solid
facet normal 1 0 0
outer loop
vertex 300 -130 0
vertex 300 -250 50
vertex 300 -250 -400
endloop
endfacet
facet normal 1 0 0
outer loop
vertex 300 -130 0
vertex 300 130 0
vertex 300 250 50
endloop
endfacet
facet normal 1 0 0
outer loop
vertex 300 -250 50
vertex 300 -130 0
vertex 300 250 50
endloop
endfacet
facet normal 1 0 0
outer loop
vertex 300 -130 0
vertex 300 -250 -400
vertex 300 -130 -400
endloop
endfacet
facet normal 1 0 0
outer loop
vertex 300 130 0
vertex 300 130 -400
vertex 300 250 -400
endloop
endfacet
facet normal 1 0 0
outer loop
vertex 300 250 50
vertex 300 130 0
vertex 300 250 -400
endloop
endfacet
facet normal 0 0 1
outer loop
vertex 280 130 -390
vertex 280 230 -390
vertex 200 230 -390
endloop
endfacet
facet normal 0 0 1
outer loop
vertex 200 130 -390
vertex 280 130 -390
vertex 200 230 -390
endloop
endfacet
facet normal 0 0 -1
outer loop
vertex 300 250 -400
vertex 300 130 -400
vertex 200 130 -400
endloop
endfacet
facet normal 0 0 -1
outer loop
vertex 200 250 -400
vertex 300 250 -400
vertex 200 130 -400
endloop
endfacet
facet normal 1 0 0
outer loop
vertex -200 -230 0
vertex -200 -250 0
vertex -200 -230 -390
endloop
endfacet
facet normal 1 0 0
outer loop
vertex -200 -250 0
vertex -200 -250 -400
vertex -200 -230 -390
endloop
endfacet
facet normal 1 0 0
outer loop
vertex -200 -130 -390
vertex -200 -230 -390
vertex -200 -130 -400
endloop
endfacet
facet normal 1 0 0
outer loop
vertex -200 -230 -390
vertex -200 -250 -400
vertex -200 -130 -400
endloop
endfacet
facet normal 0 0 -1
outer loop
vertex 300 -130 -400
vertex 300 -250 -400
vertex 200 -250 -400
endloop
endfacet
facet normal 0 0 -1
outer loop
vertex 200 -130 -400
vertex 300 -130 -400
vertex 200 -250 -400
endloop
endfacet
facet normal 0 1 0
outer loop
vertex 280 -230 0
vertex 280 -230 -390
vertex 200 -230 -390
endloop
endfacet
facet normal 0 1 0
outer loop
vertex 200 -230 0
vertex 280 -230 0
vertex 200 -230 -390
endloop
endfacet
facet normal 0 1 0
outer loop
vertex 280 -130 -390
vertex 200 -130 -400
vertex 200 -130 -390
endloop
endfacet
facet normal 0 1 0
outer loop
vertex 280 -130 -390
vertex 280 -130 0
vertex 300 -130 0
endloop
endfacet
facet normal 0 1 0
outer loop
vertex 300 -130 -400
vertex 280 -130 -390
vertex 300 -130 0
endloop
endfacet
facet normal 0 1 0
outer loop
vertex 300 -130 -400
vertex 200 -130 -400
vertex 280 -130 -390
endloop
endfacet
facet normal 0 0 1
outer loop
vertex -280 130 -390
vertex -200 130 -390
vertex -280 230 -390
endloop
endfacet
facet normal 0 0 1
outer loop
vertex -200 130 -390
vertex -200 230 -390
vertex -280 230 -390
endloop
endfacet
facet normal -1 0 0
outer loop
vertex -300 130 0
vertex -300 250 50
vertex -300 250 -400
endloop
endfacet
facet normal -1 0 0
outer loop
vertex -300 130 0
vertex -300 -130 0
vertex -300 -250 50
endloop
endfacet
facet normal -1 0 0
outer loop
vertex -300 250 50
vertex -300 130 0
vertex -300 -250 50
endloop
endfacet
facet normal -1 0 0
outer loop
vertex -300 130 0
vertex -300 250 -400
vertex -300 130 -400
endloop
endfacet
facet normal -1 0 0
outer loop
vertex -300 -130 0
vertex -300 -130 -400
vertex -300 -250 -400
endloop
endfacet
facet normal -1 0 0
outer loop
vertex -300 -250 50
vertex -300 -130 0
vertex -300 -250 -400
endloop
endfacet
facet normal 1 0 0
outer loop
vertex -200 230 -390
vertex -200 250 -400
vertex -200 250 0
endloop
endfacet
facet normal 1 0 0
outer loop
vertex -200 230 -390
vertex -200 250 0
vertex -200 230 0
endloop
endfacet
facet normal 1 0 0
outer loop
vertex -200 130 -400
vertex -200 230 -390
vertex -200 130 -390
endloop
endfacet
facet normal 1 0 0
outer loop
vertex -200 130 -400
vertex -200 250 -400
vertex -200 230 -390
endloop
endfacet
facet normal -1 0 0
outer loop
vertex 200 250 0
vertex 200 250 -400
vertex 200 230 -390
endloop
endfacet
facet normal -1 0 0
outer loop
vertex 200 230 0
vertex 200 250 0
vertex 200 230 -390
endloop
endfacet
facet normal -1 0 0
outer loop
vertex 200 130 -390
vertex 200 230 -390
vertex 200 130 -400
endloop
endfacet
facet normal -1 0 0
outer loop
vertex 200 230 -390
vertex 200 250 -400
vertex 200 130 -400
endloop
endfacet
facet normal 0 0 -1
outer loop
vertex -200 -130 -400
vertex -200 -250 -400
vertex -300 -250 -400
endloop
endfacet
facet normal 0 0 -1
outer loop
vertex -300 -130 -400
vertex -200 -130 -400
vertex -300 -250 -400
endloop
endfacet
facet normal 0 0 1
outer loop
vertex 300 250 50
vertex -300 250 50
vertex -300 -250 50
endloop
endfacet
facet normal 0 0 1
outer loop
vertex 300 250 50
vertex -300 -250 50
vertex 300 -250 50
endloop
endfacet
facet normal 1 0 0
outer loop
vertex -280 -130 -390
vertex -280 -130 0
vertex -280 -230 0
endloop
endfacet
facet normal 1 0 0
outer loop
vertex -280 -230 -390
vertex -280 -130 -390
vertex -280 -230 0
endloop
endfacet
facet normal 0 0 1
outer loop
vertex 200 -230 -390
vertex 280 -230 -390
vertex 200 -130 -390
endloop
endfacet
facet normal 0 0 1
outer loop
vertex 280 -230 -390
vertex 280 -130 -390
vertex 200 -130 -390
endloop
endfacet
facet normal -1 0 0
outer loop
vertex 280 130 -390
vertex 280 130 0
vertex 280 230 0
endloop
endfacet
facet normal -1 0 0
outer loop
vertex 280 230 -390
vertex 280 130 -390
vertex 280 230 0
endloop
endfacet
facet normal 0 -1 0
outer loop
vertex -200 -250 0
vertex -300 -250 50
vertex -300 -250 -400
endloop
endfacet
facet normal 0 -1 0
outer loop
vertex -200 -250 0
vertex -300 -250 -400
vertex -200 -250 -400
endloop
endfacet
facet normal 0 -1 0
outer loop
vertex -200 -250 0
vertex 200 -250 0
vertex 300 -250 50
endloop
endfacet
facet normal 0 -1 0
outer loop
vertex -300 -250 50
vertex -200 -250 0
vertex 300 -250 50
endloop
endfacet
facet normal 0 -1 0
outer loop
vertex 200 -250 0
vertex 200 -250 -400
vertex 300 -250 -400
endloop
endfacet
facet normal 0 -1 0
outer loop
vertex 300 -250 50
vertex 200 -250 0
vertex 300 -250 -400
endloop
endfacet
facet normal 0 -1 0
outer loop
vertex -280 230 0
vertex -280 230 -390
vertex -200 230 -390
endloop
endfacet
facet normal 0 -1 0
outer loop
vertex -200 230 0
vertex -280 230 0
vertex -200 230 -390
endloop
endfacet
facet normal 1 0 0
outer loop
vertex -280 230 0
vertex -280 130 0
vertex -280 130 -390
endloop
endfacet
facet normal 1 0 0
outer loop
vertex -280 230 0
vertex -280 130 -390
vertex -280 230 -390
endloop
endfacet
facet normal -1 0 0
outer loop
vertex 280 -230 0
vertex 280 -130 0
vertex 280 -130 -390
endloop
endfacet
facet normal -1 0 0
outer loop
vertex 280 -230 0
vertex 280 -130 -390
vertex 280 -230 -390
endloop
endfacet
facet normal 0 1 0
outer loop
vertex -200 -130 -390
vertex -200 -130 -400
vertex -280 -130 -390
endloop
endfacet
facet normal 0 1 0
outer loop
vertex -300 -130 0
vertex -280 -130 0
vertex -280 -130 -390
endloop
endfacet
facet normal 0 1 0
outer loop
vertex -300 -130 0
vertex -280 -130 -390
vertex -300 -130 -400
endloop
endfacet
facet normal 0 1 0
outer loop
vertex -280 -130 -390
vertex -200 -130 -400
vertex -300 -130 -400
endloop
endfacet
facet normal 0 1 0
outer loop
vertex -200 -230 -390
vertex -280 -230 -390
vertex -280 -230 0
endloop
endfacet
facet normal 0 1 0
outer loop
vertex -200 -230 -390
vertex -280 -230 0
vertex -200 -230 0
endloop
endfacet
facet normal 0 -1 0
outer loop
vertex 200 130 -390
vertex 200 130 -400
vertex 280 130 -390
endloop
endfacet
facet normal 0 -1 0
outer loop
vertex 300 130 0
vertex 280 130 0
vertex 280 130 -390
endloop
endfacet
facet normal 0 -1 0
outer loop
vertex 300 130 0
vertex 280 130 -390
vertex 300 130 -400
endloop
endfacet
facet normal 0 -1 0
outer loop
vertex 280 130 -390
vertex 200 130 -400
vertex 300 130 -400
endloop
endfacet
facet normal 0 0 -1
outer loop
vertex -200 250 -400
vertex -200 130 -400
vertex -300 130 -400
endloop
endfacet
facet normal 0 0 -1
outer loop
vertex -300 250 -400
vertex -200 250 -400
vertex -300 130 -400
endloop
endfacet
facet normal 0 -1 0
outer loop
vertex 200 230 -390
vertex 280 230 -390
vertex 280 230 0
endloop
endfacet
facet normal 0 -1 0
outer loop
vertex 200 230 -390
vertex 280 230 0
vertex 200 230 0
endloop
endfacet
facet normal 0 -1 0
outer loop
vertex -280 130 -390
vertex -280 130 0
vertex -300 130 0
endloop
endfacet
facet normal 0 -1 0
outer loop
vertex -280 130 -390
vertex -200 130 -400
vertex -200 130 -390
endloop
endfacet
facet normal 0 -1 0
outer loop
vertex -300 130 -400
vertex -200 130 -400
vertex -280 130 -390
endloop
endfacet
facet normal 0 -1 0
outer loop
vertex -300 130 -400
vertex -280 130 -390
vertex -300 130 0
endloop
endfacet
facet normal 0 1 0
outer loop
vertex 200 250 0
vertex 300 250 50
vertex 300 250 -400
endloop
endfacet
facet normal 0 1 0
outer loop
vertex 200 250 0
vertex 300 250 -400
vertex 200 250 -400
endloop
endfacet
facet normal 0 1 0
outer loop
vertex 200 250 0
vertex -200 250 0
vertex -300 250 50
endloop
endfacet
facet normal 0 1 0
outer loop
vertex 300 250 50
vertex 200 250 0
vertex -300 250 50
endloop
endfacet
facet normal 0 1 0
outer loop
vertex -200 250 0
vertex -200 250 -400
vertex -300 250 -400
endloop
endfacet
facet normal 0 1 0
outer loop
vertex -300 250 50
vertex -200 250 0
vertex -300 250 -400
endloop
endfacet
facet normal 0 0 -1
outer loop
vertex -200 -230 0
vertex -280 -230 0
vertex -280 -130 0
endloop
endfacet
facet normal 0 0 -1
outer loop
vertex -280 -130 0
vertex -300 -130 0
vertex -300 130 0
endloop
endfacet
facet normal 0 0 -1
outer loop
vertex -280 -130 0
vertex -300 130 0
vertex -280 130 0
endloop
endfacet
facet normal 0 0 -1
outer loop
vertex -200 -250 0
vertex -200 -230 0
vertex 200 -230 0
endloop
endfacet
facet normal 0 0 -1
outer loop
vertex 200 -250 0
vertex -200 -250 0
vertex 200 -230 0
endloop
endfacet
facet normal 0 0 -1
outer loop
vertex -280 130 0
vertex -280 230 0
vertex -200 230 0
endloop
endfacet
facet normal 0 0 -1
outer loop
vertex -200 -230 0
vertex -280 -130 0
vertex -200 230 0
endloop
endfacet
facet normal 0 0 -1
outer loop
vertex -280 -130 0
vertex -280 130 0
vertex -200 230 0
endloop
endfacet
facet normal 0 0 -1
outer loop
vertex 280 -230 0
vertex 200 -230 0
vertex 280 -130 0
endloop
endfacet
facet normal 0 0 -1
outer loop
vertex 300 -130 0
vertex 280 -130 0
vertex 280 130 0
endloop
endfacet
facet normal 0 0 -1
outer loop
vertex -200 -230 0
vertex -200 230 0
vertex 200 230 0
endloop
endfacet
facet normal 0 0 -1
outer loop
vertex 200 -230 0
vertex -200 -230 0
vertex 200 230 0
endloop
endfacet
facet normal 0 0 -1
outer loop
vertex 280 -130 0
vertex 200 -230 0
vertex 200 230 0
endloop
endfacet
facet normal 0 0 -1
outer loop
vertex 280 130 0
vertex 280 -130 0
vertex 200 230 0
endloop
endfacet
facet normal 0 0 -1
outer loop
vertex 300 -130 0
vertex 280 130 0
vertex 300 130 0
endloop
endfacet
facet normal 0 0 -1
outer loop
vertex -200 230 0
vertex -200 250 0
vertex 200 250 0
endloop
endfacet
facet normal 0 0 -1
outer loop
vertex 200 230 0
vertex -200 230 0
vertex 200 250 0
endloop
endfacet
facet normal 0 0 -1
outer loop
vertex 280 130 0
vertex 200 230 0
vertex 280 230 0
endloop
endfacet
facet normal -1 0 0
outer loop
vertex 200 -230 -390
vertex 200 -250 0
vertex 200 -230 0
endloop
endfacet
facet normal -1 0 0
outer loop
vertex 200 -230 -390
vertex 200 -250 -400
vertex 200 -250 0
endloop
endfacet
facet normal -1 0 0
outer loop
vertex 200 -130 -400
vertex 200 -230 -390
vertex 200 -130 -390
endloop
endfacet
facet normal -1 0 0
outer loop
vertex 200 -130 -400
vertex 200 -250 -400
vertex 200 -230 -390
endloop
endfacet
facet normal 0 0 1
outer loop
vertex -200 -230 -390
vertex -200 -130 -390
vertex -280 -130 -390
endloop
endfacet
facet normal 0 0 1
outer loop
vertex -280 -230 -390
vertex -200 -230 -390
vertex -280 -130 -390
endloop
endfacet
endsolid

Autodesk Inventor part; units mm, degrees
ref_plane "YZ Plane" through (0, 0, 0) normal (1, 0, 0) x (0, 1, 0)
ref_plane "XZ Plane" through (0, 0, 0) normal (0, 1, 0) x (-1, 0, 0)
ref_plane "XY Plane" through (0, 0, 0) normal (0, 0, 1) x (1, 0, 0)
sketch "Boceto1" plane through (0, 0, 0) normal (0, 0, 1) x (1, 0, 0)
  line L0 (-300, -250) -> (300, -250)
  line L1 (300, -250) -> (300, 250)
  line L2 (300, 250) -> (-300, 250)
  line L3 (-300, 250) -> (-300, -250)
  line L4 (-300, -250) -> (300, 250) construction
  line L5 (300, -250) -> (-300, 250) construction
  line L6 (-300, 250) -> (-200, 250)
  line L7 (-200, 250) -> (-200, 230)
  line L8 (-280, 130) -> (-300, 130)
  line L9 (-300, 130) -> (-300, 250)
  line L10 (-300, 130) -> (-280, 130)
  line L11 (-280, 130) -> (-280, 230)
  line L12 (-280, 230) -> (-200, 230)
  line L13 (0, 0) -> (0, 50)
  line L14 (0, 0) -> (-60, 0)
  line L15 (-300, 250) -> (300, 250)
  line L16 (300, 250) -> (300, -250)
  line L17 (-300, -250) -> (300, 250) construction
  line L18 (300, 250) -> (200, 250)
  line L19 (200, 250) -> (200, 230)
  line L20 (300, 130) -> (300, 250)
  line L21 (280, 130) -> (280, 230)
  line L22 (280, 230) -> (200, 230)
  line L23 (280, 130) -> (300, 130)
  line L24 (300, -250) -> (-300, -250)
  line L25 (-300, -250) -> (-300, 250)
  line L26 (300, 250) -> (-300, -250) construction
  line L27 (-300, -250) -> (-200, -250)
  line L28 (-200, -250) -> (-200, -230)
  line L29 (-280, -130) -> (-300, -130)
  line L30 (-300, -130) -> (-300, -250)
  line L31 (-300, -130) -> (-280, -130)
  line L32 (-280, -130) -> (-280, -230)
  line L33 (-280, -230) -> (-200, -230)
  line L34 (-300, -250) -> (300, -250)
  line L35 (300, -250) -> (200, -250)
  line L36 (200, -250) -> (200, -230)
  line L37 (300, -130) -> (300, -250)
  line L38 (280, -130) -> (280, -230)
  line L39 (280, -230) -> (200, -230)
  line L40 (280, -130) -> (300, -130)
  point P0 (-300, 130)
  point P1 (-300, -130)
  point P2 (-200, -250)
  point P3 (200, -250)
  point P4 (300, -130)
  point P5 (300, 130)
  point P6 (200, 250)
  point P7 (-200, 250)
  dimension "d0" = 600
  dimension "d1" = 500
  dimension "d4" = 20
  dimension "d5" = 100
  dimension "d6" = 60
  dimension "d13" = 20
extrude "Extrusión1" add sketch "Boceto1" along normal blind 50 contours L28 L33 L32 L29 L3 L8 L11 L12 L7 L2 L19 L22 L21 L23 L1 L40 L38 L39 L36 L0
extrude "Extrusión2" add sketch "Boceto1" along normal blind 50 and the other way blind 390 contours L3 L29 L32 L33 L28 L0 | L36 L39 L38 L40 L1 L0 | L3 L2 L7 L12 L11 L8 | L23 L21 L22 L19 L2 L1
sketch "Boceto2" plane through (0, 0, -390) normal (0, 0, -1) x (-1, 0, 0)
  line L0 (280, 230) -> (280, 130) projected
  line L1 (200, 230) -> (280, 230) projected
  line L2 (200, 250) -> (200, 230) projected
  line L3 (-200, 250) -> (200, 250) projected
  line L4 (-200, 230) -> (-200, 250) projected
  line L5 (-280, 230) -> (-200, 230) projected
  line L6 (-280, 130) -> (-280, 230) projected
  line L7 (-300, 130) -> (-280, 130) projected
  line L8 (-300, -130) -> (-300, 130) projected
  line L9 (-280, -130) -> (-300, -130) projected
  line L10 (-280, -230) -> (-280, -130) projected
  line L11 (-200, -230) -> (-280, -230) projected
  line L12 (-200, -250) -> (-200, -230) projected
  line L13 (200, -250) -> (-200, -250) projected
  line L14 (200, -230) -> (200, -250) projected
  line L15 (280, -230) -> (200, -230) projected
  line L16 (280, -130) -> (280, -230) projected
  line L17 (300, -130) -> (280, -130) projected
  line L18 (300, 130) -> (300, -130) projected
  line L19 (280, 130) -> (300, 130) projected
  line L20 (300, 250) -> (300, -250) projected
  line L21 (300, -250) -> (200, -250)
  line L22 (200, -250) -> (200, -130)
  line L23 (200, -130) -> (300, -130)
  line L24 (300, -130) -> (300, -250)
  line L25 (-300, 250) -> (-200, 250)
  line L26 (-200, 250) -> (-200, 130)
  line L27 (-200, 130) -> (-300, 130)
  line L28 (-300, 130) -> (-300, 250)
  line L29 (300, 250) -> (200, 250)
  line L30 (200, 250) -> (200, 130)
  line L31 (200, 130) -> (300, 130)
  line L32 (300, 130) -> (300, 250)
  line L33 (-300, -250) -> (-200, -250)
  line L34 (-200, -250) -> (-200, -130)
  line L35 (-200, -130) -> (-300, -130)
  line L36 (-300, -130) -> (-300, -250)
  point P0 (0, 0)
extrude "Extrusión3" add sketch "Boceto2" along normal blind 10 contours L1 L2 L29 L20 L19 L0 | L0 L31 L30 L1 | L20 L21 L14 L15 L16 L17 | L4 L5 L6 L7 L28 L25 | L16 L15 L22 L23 | L26 L27 L6 L5 | L33 L36 L9 L10 L11 L12 | L11 L10 L35 L34
properties part number "MESA_TALADRADO"
